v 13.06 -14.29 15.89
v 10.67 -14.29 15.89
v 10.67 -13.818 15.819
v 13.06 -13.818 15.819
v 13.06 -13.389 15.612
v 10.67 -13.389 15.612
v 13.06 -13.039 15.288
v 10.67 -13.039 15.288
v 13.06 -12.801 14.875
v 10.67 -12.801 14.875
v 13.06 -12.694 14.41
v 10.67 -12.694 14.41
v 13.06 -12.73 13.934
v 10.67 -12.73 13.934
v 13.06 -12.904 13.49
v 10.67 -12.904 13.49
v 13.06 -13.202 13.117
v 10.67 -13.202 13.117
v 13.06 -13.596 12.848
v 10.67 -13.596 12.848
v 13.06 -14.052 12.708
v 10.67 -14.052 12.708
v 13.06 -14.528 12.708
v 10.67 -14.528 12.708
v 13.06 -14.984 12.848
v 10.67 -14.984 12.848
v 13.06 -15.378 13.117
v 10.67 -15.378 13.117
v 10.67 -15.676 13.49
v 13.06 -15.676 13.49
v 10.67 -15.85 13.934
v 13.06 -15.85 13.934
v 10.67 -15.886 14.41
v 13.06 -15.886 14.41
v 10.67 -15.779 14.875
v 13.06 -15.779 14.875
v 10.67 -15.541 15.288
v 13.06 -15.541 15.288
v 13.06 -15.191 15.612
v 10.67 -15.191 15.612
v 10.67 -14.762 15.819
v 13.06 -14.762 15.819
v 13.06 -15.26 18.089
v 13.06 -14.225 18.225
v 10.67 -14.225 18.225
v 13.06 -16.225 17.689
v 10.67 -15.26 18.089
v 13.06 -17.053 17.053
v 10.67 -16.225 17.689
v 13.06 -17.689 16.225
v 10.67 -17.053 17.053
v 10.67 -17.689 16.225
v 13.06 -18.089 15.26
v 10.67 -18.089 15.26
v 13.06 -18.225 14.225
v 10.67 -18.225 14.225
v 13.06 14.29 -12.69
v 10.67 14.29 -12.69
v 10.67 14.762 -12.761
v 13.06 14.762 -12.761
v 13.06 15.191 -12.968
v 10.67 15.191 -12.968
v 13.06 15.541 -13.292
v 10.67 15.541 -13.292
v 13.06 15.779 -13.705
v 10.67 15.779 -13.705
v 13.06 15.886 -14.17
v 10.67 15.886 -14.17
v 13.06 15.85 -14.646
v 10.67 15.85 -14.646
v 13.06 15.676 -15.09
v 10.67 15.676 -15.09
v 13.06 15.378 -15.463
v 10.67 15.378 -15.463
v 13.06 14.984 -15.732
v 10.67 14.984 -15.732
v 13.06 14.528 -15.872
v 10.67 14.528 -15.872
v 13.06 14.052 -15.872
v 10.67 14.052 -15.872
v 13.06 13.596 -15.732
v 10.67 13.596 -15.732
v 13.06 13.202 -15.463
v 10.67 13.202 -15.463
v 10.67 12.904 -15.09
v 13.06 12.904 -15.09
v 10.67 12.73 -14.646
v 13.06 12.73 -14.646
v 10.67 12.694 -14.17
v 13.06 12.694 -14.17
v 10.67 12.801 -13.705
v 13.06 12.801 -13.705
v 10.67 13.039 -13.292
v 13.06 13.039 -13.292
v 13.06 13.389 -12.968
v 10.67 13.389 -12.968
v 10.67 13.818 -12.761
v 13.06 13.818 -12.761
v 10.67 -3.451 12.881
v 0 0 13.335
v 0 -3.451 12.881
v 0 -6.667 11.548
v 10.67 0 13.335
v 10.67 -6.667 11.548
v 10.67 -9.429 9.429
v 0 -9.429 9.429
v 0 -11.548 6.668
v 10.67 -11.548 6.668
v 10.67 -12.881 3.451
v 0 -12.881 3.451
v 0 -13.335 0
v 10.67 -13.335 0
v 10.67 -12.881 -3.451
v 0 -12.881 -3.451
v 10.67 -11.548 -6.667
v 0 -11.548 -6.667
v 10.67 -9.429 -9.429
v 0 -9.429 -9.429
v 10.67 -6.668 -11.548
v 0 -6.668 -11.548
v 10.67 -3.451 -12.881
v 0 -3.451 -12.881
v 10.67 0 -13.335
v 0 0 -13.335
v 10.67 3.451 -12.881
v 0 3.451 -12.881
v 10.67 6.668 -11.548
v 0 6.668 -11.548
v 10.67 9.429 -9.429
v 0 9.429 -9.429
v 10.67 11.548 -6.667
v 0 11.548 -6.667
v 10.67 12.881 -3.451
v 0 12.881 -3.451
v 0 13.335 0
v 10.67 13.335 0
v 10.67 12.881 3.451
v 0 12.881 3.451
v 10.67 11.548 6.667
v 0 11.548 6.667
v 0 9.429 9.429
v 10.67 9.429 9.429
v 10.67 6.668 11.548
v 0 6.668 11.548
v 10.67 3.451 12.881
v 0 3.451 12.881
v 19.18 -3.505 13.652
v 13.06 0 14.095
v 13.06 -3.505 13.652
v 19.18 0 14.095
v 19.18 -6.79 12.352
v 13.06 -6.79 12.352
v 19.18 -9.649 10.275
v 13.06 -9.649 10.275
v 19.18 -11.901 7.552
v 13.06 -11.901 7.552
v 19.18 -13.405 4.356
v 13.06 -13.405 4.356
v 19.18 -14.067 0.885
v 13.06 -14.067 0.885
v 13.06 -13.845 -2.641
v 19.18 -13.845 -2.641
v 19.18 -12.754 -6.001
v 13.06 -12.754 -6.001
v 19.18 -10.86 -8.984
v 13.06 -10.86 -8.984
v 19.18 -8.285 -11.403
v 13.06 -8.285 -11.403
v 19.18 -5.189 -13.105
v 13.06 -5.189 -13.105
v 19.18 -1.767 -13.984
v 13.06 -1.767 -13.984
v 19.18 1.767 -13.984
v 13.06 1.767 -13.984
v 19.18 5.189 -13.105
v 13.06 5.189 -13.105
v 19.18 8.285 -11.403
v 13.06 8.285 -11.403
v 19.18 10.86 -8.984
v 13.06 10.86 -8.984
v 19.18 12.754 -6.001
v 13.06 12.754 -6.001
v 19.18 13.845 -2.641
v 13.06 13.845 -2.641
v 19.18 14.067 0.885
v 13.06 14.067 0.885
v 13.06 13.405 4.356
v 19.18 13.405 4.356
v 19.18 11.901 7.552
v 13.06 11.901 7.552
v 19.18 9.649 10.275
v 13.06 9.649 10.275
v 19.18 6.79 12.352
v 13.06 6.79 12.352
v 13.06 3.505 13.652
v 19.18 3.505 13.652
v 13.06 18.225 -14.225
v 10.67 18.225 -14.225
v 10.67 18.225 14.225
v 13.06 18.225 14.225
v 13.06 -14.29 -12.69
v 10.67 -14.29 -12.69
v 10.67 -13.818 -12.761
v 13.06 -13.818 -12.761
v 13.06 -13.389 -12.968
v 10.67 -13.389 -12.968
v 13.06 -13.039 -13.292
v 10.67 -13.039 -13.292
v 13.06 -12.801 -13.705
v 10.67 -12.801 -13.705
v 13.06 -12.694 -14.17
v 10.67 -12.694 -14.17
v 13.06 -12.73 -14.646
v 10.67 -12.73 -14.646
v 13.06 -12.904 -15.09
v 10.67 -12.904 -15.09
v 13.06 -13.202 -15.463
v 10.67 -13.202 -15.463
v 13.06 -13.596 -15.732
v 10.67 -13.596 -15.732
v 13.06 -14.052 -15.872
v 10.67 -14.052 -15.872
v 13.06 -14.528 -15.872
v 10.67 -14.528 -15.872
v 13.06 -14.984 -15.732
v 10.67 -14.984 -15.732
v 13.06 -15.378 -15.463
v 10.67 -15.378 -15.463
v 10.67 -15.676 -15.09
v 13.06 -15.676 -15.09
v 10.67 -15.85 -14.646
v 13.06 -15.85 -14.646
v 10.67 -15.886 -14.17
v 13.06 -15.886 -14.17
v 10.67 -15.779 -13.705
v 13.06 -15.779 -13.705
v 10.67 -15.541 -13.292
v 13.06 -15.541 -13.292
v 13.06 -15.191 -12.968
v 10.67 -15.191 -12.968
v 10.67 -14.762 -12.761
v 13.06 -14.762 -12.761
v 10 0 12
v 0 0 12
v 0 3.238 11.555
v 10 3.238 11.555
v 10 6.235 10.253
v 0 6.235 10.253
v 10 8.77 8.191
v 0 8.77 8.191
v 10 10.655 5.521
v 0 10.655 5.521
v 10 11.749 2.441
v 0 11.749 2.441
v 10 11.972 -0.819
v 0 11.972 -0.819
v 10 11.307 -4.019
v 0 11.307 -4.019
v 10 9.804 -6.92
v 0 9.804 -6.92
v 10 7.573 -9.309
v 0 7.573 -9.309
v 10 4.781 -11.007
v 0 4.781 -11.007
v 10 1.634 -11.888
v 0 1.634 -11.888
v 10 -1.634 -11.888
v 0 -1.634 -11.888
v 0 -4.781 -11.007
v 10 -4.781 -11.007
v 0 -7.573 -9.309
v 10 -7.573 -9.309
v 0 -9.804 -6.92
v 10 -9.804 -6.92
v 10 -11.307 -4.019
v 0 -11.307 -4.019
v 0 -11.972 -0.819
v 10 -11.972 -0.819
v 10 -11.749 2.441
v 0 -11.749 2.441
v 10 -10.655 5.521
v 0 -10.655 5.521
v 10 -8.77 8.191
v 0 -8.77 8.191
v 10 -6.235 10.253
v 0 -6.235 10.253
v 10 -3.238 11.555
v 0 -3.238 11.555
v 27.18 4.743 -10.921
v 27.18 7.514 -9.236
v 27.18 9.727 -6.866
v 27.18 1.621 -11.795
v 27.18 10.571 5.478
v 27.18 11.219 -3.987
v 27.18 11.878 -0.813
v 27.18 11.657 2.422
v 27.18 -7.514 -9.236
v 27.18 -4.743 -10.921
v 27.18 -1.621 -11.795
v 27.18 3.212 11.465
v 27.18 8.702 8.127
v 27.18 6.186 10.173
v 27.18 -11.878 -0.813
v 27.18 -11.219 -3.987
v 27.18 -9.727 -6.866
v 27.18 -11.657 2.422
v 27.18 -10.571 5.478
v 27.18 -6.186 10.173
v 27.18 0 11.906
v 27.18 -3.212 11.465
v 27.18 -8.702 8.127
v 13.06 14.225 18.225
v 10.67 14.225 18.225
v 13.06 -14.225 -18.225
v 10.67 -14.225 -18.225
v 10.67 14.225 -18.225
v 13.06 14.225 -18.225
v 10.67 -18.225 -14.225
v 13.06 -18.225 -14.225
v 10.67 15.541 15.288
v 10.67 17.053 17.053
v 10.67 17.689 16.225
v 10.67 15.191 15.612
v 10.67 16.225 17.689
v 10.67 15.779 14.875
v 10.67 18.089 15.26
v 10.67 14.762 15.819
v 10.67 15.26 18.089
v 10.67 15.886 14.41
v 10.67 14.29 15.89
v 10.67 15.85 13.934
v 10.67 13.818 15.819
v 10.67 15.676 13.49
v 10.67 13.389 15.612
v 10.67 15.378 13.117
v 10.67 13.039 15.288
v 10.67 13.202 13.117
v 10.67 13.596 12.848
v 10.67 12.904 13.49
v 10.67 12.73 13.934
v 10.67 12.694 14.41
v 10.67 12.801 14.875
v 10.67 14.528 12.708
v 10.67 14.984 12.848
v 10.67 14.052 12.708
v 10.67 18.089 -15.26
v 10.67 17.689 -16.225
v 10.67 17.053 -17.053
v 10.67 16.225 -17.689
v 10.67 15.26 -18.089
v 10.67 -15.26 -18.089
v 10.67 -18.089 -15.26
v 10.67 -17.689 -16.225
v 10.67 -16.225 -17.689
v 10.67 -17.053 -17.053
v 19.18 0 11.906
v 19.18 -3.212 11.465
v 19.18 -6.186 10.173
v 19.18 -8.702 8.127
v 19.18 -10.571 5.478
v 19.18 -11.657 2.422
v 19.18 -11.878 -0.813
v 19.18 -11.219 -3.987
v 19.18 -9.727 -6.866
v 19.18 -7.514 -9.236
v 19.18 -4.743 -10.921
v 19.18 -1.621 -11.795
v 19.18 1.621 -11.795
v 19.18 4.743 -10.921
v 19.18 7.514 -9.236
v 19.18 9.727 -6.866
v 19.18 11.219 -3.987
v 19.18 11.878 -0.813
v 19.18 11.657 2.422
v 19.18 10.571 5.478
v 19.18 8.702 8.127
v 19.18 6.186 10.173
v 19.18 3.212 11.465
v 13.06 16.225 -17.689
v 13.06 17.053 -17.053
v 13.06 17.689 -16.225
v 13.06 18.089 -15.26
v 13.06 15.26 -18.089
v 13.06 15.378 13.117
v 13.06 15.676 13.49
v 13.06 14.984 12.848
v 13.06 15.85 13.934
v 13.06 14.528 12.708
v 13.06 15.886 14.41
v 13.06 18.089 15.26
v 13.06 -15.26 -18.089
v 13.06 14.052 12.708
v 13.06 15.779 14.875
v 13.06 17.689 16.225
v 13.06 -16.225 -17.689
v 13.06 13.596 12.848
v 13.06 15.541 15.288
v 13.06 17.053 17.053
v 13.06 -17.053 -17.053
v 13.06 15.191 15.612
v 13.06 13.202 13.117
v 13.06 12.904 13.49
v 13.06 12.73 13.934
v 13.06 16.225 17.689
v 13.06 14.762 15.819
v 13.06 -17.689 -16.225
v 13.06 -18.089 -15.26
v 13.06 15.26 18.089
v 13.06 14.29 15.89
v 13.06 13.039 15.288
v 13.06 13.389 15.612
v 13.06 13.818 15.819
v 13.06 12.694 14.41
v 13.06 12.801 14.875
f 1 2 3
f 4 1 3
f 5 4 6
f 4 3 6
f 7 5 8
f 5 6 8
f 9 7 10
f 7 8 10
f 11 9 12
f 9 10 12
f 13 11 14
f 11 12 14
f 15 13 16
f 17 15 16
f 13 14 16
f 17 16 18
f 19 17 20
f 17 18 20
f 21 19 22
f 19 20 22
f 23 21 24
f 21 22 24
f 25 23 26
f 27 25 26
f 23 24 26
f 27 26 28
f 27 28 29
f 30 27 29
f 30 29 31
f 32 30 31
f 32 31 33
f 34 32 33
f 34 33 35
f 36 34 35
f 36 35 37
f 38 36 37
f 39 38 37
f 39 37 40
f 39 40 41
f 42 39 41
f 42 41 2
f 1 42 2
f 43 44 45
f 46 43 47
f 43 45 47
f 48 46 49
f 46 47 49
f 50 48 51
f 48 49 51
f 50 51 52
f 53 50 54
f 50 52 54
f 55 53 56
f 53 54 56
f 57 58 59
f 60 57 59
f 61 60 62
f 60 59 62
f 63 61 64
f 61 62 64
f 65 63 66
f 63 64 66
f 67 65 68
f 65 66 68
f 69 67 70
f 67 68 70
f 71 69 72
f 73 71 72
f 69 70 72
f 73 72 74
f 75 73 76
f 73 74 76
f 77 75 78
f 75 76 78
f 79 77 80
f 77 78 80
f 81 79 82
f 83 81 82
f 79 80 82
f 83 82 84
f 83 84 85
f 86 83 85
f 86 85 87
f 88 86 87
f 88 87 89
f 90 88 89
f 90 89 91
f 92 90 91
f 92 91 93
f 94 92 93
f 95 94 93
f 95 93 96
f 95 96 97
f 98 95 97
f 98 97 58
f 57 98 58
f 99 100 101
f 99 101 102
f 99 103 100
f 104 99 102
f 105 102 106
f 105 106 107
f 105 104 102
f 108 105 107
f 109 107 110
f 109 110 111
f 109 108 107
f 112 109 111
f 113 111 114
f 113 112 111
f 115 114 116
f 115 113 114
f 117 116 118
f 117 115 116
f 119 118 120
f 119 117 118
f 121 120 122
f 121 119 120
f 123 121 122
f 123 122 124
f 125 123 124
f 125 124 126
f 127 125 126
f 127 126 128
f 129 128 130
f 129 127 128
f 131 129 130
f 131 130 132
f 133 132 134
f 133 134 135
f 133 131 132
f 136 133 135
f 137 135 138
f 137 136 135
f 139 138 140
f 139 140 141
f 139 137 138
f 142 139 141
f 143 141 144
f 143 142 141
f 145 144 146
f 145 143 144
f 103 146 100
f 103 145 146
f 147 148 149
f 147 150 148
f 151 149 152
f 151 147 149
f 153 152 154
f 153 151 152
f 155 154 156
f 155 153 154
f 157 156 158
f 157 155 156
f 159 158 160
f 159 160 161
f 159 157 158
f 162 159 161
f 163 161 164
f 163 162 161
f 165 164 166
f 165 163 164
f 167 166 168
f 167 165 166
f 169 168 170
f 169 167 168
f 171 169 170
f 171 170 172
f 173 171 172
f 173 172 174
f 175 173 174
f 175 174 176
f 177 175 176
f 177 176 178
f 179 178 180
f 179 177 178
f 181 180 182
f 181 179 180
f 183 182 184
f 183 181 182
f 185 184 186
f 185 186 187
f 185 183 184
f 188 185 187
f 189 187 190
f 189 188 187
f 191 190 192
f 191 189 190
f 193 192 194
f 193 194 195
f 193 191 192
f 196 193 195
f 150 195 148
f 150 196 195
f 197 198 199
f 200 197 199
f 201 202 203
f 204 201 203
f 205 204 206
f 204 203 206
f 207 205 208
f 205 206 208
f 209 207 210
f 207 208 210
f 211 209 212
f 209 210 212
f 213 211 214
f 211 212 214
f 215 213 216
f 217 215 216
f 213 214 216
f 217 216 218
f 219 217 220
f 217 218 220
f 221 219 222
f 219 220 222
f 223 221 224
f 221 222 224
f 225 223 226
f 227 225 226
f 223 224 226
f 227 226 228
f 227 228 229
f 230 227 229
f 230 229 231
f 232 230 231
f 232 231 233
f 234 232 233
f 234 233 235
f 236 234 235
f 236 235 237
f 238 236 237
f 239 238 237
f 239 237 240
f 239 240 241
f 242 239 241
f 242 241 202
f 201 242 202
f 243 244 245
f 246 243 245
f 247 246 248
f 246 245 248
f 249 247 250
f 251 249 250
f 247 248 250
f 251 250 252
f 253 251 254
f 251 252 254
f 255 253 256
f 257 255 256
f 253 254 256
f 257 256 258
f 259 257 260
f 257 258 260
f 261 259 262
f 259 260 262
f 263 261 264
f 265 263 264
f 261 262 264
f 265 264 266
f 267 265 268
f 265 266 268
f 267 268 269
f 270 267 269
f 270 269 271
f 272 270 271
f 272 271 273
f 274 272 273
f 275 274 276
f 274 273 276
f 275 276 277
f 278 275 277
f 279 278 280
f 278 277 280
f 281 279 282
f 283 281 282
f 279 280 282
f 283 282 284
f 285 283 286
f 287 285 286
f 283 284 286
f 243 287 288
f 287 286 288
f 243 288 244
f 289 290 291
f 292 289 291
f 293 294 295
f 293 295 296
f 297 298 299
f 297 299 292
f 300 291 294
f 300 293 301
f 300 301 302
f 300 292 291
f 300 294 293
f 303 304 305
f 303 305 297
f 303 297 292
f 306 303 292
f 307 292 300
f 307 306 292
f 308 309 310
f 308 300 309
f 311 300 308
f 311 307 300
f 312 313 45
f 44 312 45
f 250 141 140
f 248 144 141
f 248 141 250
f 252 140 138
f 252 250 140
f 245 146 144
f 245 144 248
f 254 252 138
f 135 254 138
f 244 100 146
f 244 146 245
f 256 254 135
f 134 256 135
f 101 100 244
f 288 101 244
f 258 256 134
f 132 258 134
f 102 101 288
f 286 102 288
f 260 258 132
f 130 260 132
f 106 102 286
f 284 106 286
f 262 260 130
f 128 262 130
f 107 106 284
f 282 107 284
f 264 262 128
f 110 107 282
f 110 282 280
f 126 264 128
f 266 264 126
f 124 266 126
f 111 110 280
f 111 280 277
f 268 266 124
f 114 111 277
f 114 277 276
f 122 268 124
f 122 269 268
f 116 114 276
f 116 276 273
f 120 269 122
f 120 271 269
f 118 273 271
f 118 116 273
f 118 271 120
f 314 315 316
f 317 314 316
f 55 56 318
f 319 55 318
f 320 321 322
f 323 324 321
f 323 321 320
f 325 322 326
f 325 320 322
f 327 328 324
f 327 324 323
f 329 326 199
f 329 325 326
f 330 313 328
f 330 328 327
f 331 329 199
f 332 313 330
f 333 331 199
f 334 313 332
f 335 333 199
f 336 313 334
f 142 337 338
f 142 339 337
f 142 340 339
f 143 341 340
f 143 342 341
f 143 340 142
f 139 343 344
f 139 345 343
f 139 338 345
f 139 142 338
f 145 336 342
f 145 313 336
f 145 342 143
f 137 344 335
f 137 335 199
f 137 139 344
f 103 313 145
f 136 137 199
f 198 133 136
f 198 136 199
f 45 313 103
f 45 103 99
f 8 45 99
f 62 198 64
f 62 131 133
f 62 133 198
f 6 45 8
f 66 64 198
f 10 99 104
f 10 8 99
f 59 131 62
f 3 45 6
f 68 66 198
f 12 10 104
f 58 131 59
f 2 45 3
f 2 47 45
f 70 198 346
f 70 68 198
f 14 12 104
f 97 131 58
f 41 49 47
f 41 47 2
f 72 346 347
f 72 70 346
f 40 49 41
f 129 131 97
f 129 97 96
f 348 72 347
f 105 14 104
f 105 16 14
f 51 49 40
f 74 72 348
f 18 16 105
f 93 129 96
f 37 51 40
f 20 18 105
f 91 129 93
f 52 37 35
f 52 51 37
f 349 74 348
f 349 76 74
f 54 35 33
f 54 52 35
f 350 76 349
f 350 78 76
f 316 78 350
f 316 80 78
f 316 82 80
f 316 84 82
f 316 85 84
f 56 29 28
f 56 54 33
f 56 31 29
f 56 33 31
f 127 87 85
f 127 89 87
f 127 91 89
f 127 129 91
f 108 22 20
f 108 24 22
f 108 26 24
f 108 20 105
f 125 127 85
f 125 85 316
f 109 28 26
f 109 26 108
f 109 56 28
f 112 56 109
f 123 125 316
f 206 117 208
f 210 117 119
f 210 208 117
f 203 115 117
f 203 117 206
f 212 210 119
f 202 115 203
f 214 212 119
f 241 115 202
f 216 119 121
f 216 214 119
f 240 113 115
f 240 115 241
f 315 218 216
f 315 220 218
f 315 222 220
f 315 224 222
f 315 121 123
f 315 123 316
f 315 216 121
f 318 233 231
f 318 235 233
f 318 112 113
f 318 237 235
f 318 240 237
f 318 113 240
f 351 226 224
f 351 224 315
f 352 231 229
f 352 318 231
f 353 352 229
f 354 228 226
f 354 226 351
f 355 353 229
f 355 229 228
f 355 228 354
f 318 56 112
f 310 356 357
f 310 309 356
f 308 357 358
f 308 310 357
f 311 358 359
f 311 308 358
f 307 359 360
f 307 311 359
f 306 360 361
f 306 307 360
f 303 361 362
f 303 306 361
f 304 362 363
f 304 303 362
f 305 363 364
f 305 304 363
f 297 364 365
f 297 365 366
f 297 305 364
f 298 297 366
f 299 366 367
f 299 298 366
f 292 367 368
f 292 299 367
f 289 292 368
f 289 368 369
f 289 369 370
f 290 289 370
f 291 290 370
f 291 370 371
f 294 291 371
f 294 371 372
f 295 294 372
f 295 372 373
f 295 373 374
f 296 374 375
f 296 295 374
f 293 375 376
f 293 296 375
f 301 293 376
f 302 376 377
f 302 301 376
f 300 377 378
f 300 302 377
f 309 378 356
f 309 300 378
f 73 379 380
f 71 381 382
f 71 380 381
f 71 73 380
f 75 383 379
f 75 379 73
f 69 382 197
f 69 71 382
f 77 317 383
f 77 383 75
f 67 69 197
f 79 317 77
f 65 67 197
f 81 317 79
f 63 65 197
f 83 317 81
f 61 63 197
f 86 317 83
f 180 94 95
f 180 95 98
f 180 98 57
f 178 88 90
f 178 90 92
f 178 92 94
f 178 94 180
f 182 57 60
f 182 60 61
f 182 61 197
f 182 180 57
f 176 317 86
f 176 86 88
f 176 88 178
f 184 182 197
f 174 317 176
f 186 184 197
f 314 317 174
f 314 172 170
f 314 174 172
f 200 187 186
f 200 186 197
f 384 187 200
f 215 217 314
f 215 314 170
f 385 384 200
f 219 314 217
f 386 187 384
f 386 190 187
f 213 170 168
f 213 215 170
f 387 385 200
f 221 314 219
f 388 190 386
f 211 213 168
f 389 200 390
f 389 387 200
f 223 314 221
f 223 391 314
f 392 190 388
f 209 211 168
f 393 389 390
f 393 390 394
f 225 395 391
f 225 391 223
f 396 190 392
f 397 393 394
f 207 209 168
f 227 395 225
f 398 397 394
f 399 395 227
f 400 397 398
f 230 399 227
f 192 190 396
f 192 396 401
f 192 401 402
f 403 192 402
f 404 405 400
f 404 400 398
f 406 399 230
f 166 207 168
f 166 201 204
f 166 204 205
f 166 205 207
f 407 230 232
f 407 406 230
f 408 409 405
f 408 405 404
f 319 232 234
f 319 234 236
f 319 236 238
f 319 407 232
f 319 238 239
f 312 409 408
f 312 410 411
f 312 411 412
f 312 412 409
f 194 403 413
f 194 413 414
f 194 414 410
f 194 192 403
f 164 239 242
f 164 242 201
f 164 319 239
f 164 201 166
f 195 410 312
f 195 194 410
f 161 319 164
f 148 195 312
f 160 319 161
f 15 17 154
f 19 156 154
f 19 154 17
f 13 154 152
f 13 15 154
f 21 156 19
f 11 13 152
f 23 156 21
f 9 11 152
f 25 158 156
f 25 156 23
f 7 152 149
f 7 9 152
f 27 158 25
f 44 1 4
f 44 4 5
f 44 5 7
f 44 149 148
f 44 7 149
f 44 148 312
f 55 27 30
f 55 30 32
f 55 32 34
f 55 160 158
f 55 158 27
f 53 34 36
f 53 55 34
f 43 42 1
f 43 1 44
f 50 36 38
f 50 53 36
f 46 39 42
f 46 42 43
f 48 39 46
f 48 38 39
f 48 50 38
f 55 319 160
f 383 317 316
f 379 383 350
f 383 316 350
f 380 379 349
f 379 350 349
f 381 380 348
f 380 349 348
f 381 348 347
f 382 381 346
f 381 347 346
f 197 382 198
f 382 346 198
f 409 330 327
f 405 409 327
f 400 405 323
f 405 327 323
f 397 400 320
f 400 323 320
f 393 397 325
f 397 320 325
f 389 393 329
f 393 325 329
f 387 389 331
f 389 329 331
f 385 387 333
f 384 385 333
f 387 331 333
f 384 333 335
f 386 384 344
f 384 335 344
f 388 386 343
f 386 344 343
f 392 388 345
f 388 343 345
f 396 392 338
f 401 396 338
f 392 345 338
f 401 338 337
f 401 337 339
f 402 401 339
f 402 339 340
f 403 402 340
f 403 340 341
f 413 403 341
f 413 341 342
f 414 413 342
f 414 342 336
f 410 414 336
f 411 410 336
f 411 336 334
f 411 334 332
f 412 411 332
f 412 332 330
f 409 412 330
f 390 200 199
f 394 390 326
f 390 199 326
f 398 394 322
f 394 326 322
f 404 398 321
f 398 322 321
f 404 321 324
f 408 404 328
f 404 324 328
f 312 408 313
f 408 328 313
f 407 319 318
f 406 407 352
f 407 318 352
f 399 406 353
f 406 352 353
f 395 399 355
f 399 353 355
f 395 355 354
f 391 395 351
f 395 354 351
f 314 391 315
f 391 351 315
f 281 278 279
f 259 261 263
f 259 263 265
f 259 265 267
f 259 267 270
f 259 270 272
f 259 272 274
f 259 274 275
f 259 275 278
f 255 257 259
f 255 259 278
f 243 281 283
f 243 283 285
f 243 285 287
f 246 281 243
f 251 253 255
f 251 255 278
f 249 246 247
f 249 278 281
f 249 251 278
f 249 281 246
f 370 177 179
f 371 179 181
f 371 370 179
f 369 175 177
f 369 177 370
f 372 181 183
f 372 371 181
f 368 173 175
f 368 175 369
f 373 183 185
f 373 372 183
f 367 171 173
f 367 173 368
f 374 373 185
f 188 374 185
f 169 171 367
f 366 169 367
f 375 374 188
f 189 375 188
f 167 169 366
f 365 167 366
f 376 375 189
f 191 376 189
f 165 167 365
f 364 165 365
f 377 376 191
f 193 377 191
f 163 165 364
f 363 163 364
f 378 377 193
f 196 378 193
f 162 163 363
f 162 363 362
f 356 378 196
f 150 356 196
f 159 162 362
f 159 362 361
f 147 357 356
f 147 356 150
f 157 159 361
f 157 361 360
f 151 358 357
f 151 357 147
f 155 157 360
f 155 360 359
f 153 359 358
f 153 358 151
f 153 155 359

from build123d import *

# Parameters (mm, degrees)
SKETCH2_OUTSIDE_W  = 79.82
SKETCH2_OUTSIDE_H  = 79.82
SKETCH2_OUTSIDE_R  = 1.6
CUT_EXTRUDE1_DEPTH = 10
SKETCH3_R          = 12
CUT_EXTRUDE2_DEPTH = 10


with BuildPart() as part:
    # Sketch1 → Revolve1 (revolve)
    with BuildSketch(Plane.XY, mode=Mode.PRIVATE) as revolve1_sk:
        Polygon((0, 0), (0, 13.335), (10.67, 13.335), (10.67, 30), (13.06, 30), (13.06, 14.095), (19.18, 14.095), (19.18, 11.90625), (27.18, 11.90625), (27.18, 0), align=None)
    revolve(revolve1_sk.sketch.rotate(Axis((0, 0, 0), (1, 0, 0)), 90), axis=Axis((0, 0, 0), (1, 0, 0)))  # turned: the seam where the file's is

    # Sketch2 outside → Cut-Extrude1 (cut)
    with BuildSketch(Plane.ZY.offset(-10.67)):
        Rectangle(SKETCH2_OUTSIDE_W, SKETCH2_OUTSIDE_H)
        with BuildLine():
            Line((-14.225, 18.225), (14.225, 18.225))
            ThreePointArc((14.225, 18.225), (17.053427125, 17.053427125), (18.225, 14.225))
            Line((18.225, 14.225), (18.225, -14.225))
            ThreePointArc((18.225, -14.225), (17.053427125, -17.053427125), (14.225, -18.225))
            Line((14.225, -18.225), (-14.225, -18.225))
            ThreePointArc((-14.225, -18.225), (-17.053427125, -17.053427125), (-18.225, -14.225))
            Line((-18.225, -14.225), (-18.225, 14.225))
            ThreePointArc((-18.225, 14.225), (-17.053427125, 17.053427125), (-14.225, 18.225))
        make_face(mode=Mode.SUBTRACT)
        with Locations((-14.29, 14.29)):
            Circle(SKETCH2_OUTSIDE_R)
        with Locations((14.29, 14.29)):
            Circle(SKETCH2_OUTSIDE_R)
        with Locations((14.29, -14.29)):
            Circle(SKETCH2_OUTSIDE_R)
        with Locations((-14.29, -14.29)):
            Circle(SKETCH2_OUTSIDE_R)
    extrude(amount=-CUT_EXTRUDE1_DEPTH, mode=Mode.SUBTRACT)

    # Sketch3 → Cut-Extrude2 (cut)
    with BuildSketch(Plane.ZY):
        Circle(SKETCH3_R)
    extrude(amount=-CUT_EXTRUDE2_DEPTH, mode=Mode.SUBTRACT)


solid = part.part
